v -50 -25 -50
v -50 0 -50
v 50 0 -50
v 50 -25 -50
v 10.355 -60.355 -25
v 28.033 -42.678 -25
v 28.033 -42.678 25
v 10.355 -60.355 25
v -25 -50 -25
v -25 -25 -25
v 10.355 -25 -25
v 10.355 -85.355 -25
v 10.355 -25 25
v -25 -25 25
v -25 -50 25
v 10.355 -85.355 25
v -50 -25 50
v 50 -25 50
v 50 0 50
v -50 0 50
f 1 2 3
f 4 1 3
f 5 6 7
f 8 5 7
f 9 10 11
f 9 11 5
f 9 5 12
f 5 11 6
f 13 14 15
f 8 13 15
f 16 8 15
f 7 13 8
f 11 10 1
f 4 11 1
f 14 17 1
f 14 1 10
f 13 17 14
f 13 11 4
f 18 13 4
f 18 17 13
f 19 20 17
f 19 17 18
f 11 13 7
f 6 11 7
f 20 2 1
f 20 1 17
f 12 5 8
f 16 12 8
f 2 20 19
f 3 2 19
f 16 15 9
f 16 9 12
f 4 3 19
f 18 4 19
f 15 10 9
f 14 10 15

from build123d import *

# Parameters (mm, degrees)
F1_W      = 50
F1_H      = 50
F2_DEPTH  = 25
F3_ANGLE  = 45
F0_W      = 100
F0_H      = 100
F2_FACE_W = 50
F2_FACE_H = 50
F4_DEPTH  = 25


with BuildPart() as f2:
    # F1 (on Front) → F2 (new body)
    with BuildSketch(Plane.XZ):
        Rectangle(F1_W, F1_H)
    extrude(amount=F2_DEPTH)


with BuildPart() as f2_1:
    # F3: moved
    add(f2.part.rotate(Axis((-25, -25, 0), (0, 0, -1)), F3_ANGLE))

    # F0 (on Front) + F2_face (on face) → F4 (join)
    with BuildSketch(Plane.XZ):
        Rectangle(F0_W, F0_H)
    with BuildSketch(Plane(origin=(-7.3223304703, -42.6776695297, 0), x_dir=(0.7071067812, -0.7071067812, 0), z_dir=(-0.7071067812, -0.7071067812, 0))):
        Rectangle(F2_FACE_W, F2_FACE_H)
    extrude(amount=F4_DEPTH, dir=(0, -1, 0))


solid = f2_1.part
